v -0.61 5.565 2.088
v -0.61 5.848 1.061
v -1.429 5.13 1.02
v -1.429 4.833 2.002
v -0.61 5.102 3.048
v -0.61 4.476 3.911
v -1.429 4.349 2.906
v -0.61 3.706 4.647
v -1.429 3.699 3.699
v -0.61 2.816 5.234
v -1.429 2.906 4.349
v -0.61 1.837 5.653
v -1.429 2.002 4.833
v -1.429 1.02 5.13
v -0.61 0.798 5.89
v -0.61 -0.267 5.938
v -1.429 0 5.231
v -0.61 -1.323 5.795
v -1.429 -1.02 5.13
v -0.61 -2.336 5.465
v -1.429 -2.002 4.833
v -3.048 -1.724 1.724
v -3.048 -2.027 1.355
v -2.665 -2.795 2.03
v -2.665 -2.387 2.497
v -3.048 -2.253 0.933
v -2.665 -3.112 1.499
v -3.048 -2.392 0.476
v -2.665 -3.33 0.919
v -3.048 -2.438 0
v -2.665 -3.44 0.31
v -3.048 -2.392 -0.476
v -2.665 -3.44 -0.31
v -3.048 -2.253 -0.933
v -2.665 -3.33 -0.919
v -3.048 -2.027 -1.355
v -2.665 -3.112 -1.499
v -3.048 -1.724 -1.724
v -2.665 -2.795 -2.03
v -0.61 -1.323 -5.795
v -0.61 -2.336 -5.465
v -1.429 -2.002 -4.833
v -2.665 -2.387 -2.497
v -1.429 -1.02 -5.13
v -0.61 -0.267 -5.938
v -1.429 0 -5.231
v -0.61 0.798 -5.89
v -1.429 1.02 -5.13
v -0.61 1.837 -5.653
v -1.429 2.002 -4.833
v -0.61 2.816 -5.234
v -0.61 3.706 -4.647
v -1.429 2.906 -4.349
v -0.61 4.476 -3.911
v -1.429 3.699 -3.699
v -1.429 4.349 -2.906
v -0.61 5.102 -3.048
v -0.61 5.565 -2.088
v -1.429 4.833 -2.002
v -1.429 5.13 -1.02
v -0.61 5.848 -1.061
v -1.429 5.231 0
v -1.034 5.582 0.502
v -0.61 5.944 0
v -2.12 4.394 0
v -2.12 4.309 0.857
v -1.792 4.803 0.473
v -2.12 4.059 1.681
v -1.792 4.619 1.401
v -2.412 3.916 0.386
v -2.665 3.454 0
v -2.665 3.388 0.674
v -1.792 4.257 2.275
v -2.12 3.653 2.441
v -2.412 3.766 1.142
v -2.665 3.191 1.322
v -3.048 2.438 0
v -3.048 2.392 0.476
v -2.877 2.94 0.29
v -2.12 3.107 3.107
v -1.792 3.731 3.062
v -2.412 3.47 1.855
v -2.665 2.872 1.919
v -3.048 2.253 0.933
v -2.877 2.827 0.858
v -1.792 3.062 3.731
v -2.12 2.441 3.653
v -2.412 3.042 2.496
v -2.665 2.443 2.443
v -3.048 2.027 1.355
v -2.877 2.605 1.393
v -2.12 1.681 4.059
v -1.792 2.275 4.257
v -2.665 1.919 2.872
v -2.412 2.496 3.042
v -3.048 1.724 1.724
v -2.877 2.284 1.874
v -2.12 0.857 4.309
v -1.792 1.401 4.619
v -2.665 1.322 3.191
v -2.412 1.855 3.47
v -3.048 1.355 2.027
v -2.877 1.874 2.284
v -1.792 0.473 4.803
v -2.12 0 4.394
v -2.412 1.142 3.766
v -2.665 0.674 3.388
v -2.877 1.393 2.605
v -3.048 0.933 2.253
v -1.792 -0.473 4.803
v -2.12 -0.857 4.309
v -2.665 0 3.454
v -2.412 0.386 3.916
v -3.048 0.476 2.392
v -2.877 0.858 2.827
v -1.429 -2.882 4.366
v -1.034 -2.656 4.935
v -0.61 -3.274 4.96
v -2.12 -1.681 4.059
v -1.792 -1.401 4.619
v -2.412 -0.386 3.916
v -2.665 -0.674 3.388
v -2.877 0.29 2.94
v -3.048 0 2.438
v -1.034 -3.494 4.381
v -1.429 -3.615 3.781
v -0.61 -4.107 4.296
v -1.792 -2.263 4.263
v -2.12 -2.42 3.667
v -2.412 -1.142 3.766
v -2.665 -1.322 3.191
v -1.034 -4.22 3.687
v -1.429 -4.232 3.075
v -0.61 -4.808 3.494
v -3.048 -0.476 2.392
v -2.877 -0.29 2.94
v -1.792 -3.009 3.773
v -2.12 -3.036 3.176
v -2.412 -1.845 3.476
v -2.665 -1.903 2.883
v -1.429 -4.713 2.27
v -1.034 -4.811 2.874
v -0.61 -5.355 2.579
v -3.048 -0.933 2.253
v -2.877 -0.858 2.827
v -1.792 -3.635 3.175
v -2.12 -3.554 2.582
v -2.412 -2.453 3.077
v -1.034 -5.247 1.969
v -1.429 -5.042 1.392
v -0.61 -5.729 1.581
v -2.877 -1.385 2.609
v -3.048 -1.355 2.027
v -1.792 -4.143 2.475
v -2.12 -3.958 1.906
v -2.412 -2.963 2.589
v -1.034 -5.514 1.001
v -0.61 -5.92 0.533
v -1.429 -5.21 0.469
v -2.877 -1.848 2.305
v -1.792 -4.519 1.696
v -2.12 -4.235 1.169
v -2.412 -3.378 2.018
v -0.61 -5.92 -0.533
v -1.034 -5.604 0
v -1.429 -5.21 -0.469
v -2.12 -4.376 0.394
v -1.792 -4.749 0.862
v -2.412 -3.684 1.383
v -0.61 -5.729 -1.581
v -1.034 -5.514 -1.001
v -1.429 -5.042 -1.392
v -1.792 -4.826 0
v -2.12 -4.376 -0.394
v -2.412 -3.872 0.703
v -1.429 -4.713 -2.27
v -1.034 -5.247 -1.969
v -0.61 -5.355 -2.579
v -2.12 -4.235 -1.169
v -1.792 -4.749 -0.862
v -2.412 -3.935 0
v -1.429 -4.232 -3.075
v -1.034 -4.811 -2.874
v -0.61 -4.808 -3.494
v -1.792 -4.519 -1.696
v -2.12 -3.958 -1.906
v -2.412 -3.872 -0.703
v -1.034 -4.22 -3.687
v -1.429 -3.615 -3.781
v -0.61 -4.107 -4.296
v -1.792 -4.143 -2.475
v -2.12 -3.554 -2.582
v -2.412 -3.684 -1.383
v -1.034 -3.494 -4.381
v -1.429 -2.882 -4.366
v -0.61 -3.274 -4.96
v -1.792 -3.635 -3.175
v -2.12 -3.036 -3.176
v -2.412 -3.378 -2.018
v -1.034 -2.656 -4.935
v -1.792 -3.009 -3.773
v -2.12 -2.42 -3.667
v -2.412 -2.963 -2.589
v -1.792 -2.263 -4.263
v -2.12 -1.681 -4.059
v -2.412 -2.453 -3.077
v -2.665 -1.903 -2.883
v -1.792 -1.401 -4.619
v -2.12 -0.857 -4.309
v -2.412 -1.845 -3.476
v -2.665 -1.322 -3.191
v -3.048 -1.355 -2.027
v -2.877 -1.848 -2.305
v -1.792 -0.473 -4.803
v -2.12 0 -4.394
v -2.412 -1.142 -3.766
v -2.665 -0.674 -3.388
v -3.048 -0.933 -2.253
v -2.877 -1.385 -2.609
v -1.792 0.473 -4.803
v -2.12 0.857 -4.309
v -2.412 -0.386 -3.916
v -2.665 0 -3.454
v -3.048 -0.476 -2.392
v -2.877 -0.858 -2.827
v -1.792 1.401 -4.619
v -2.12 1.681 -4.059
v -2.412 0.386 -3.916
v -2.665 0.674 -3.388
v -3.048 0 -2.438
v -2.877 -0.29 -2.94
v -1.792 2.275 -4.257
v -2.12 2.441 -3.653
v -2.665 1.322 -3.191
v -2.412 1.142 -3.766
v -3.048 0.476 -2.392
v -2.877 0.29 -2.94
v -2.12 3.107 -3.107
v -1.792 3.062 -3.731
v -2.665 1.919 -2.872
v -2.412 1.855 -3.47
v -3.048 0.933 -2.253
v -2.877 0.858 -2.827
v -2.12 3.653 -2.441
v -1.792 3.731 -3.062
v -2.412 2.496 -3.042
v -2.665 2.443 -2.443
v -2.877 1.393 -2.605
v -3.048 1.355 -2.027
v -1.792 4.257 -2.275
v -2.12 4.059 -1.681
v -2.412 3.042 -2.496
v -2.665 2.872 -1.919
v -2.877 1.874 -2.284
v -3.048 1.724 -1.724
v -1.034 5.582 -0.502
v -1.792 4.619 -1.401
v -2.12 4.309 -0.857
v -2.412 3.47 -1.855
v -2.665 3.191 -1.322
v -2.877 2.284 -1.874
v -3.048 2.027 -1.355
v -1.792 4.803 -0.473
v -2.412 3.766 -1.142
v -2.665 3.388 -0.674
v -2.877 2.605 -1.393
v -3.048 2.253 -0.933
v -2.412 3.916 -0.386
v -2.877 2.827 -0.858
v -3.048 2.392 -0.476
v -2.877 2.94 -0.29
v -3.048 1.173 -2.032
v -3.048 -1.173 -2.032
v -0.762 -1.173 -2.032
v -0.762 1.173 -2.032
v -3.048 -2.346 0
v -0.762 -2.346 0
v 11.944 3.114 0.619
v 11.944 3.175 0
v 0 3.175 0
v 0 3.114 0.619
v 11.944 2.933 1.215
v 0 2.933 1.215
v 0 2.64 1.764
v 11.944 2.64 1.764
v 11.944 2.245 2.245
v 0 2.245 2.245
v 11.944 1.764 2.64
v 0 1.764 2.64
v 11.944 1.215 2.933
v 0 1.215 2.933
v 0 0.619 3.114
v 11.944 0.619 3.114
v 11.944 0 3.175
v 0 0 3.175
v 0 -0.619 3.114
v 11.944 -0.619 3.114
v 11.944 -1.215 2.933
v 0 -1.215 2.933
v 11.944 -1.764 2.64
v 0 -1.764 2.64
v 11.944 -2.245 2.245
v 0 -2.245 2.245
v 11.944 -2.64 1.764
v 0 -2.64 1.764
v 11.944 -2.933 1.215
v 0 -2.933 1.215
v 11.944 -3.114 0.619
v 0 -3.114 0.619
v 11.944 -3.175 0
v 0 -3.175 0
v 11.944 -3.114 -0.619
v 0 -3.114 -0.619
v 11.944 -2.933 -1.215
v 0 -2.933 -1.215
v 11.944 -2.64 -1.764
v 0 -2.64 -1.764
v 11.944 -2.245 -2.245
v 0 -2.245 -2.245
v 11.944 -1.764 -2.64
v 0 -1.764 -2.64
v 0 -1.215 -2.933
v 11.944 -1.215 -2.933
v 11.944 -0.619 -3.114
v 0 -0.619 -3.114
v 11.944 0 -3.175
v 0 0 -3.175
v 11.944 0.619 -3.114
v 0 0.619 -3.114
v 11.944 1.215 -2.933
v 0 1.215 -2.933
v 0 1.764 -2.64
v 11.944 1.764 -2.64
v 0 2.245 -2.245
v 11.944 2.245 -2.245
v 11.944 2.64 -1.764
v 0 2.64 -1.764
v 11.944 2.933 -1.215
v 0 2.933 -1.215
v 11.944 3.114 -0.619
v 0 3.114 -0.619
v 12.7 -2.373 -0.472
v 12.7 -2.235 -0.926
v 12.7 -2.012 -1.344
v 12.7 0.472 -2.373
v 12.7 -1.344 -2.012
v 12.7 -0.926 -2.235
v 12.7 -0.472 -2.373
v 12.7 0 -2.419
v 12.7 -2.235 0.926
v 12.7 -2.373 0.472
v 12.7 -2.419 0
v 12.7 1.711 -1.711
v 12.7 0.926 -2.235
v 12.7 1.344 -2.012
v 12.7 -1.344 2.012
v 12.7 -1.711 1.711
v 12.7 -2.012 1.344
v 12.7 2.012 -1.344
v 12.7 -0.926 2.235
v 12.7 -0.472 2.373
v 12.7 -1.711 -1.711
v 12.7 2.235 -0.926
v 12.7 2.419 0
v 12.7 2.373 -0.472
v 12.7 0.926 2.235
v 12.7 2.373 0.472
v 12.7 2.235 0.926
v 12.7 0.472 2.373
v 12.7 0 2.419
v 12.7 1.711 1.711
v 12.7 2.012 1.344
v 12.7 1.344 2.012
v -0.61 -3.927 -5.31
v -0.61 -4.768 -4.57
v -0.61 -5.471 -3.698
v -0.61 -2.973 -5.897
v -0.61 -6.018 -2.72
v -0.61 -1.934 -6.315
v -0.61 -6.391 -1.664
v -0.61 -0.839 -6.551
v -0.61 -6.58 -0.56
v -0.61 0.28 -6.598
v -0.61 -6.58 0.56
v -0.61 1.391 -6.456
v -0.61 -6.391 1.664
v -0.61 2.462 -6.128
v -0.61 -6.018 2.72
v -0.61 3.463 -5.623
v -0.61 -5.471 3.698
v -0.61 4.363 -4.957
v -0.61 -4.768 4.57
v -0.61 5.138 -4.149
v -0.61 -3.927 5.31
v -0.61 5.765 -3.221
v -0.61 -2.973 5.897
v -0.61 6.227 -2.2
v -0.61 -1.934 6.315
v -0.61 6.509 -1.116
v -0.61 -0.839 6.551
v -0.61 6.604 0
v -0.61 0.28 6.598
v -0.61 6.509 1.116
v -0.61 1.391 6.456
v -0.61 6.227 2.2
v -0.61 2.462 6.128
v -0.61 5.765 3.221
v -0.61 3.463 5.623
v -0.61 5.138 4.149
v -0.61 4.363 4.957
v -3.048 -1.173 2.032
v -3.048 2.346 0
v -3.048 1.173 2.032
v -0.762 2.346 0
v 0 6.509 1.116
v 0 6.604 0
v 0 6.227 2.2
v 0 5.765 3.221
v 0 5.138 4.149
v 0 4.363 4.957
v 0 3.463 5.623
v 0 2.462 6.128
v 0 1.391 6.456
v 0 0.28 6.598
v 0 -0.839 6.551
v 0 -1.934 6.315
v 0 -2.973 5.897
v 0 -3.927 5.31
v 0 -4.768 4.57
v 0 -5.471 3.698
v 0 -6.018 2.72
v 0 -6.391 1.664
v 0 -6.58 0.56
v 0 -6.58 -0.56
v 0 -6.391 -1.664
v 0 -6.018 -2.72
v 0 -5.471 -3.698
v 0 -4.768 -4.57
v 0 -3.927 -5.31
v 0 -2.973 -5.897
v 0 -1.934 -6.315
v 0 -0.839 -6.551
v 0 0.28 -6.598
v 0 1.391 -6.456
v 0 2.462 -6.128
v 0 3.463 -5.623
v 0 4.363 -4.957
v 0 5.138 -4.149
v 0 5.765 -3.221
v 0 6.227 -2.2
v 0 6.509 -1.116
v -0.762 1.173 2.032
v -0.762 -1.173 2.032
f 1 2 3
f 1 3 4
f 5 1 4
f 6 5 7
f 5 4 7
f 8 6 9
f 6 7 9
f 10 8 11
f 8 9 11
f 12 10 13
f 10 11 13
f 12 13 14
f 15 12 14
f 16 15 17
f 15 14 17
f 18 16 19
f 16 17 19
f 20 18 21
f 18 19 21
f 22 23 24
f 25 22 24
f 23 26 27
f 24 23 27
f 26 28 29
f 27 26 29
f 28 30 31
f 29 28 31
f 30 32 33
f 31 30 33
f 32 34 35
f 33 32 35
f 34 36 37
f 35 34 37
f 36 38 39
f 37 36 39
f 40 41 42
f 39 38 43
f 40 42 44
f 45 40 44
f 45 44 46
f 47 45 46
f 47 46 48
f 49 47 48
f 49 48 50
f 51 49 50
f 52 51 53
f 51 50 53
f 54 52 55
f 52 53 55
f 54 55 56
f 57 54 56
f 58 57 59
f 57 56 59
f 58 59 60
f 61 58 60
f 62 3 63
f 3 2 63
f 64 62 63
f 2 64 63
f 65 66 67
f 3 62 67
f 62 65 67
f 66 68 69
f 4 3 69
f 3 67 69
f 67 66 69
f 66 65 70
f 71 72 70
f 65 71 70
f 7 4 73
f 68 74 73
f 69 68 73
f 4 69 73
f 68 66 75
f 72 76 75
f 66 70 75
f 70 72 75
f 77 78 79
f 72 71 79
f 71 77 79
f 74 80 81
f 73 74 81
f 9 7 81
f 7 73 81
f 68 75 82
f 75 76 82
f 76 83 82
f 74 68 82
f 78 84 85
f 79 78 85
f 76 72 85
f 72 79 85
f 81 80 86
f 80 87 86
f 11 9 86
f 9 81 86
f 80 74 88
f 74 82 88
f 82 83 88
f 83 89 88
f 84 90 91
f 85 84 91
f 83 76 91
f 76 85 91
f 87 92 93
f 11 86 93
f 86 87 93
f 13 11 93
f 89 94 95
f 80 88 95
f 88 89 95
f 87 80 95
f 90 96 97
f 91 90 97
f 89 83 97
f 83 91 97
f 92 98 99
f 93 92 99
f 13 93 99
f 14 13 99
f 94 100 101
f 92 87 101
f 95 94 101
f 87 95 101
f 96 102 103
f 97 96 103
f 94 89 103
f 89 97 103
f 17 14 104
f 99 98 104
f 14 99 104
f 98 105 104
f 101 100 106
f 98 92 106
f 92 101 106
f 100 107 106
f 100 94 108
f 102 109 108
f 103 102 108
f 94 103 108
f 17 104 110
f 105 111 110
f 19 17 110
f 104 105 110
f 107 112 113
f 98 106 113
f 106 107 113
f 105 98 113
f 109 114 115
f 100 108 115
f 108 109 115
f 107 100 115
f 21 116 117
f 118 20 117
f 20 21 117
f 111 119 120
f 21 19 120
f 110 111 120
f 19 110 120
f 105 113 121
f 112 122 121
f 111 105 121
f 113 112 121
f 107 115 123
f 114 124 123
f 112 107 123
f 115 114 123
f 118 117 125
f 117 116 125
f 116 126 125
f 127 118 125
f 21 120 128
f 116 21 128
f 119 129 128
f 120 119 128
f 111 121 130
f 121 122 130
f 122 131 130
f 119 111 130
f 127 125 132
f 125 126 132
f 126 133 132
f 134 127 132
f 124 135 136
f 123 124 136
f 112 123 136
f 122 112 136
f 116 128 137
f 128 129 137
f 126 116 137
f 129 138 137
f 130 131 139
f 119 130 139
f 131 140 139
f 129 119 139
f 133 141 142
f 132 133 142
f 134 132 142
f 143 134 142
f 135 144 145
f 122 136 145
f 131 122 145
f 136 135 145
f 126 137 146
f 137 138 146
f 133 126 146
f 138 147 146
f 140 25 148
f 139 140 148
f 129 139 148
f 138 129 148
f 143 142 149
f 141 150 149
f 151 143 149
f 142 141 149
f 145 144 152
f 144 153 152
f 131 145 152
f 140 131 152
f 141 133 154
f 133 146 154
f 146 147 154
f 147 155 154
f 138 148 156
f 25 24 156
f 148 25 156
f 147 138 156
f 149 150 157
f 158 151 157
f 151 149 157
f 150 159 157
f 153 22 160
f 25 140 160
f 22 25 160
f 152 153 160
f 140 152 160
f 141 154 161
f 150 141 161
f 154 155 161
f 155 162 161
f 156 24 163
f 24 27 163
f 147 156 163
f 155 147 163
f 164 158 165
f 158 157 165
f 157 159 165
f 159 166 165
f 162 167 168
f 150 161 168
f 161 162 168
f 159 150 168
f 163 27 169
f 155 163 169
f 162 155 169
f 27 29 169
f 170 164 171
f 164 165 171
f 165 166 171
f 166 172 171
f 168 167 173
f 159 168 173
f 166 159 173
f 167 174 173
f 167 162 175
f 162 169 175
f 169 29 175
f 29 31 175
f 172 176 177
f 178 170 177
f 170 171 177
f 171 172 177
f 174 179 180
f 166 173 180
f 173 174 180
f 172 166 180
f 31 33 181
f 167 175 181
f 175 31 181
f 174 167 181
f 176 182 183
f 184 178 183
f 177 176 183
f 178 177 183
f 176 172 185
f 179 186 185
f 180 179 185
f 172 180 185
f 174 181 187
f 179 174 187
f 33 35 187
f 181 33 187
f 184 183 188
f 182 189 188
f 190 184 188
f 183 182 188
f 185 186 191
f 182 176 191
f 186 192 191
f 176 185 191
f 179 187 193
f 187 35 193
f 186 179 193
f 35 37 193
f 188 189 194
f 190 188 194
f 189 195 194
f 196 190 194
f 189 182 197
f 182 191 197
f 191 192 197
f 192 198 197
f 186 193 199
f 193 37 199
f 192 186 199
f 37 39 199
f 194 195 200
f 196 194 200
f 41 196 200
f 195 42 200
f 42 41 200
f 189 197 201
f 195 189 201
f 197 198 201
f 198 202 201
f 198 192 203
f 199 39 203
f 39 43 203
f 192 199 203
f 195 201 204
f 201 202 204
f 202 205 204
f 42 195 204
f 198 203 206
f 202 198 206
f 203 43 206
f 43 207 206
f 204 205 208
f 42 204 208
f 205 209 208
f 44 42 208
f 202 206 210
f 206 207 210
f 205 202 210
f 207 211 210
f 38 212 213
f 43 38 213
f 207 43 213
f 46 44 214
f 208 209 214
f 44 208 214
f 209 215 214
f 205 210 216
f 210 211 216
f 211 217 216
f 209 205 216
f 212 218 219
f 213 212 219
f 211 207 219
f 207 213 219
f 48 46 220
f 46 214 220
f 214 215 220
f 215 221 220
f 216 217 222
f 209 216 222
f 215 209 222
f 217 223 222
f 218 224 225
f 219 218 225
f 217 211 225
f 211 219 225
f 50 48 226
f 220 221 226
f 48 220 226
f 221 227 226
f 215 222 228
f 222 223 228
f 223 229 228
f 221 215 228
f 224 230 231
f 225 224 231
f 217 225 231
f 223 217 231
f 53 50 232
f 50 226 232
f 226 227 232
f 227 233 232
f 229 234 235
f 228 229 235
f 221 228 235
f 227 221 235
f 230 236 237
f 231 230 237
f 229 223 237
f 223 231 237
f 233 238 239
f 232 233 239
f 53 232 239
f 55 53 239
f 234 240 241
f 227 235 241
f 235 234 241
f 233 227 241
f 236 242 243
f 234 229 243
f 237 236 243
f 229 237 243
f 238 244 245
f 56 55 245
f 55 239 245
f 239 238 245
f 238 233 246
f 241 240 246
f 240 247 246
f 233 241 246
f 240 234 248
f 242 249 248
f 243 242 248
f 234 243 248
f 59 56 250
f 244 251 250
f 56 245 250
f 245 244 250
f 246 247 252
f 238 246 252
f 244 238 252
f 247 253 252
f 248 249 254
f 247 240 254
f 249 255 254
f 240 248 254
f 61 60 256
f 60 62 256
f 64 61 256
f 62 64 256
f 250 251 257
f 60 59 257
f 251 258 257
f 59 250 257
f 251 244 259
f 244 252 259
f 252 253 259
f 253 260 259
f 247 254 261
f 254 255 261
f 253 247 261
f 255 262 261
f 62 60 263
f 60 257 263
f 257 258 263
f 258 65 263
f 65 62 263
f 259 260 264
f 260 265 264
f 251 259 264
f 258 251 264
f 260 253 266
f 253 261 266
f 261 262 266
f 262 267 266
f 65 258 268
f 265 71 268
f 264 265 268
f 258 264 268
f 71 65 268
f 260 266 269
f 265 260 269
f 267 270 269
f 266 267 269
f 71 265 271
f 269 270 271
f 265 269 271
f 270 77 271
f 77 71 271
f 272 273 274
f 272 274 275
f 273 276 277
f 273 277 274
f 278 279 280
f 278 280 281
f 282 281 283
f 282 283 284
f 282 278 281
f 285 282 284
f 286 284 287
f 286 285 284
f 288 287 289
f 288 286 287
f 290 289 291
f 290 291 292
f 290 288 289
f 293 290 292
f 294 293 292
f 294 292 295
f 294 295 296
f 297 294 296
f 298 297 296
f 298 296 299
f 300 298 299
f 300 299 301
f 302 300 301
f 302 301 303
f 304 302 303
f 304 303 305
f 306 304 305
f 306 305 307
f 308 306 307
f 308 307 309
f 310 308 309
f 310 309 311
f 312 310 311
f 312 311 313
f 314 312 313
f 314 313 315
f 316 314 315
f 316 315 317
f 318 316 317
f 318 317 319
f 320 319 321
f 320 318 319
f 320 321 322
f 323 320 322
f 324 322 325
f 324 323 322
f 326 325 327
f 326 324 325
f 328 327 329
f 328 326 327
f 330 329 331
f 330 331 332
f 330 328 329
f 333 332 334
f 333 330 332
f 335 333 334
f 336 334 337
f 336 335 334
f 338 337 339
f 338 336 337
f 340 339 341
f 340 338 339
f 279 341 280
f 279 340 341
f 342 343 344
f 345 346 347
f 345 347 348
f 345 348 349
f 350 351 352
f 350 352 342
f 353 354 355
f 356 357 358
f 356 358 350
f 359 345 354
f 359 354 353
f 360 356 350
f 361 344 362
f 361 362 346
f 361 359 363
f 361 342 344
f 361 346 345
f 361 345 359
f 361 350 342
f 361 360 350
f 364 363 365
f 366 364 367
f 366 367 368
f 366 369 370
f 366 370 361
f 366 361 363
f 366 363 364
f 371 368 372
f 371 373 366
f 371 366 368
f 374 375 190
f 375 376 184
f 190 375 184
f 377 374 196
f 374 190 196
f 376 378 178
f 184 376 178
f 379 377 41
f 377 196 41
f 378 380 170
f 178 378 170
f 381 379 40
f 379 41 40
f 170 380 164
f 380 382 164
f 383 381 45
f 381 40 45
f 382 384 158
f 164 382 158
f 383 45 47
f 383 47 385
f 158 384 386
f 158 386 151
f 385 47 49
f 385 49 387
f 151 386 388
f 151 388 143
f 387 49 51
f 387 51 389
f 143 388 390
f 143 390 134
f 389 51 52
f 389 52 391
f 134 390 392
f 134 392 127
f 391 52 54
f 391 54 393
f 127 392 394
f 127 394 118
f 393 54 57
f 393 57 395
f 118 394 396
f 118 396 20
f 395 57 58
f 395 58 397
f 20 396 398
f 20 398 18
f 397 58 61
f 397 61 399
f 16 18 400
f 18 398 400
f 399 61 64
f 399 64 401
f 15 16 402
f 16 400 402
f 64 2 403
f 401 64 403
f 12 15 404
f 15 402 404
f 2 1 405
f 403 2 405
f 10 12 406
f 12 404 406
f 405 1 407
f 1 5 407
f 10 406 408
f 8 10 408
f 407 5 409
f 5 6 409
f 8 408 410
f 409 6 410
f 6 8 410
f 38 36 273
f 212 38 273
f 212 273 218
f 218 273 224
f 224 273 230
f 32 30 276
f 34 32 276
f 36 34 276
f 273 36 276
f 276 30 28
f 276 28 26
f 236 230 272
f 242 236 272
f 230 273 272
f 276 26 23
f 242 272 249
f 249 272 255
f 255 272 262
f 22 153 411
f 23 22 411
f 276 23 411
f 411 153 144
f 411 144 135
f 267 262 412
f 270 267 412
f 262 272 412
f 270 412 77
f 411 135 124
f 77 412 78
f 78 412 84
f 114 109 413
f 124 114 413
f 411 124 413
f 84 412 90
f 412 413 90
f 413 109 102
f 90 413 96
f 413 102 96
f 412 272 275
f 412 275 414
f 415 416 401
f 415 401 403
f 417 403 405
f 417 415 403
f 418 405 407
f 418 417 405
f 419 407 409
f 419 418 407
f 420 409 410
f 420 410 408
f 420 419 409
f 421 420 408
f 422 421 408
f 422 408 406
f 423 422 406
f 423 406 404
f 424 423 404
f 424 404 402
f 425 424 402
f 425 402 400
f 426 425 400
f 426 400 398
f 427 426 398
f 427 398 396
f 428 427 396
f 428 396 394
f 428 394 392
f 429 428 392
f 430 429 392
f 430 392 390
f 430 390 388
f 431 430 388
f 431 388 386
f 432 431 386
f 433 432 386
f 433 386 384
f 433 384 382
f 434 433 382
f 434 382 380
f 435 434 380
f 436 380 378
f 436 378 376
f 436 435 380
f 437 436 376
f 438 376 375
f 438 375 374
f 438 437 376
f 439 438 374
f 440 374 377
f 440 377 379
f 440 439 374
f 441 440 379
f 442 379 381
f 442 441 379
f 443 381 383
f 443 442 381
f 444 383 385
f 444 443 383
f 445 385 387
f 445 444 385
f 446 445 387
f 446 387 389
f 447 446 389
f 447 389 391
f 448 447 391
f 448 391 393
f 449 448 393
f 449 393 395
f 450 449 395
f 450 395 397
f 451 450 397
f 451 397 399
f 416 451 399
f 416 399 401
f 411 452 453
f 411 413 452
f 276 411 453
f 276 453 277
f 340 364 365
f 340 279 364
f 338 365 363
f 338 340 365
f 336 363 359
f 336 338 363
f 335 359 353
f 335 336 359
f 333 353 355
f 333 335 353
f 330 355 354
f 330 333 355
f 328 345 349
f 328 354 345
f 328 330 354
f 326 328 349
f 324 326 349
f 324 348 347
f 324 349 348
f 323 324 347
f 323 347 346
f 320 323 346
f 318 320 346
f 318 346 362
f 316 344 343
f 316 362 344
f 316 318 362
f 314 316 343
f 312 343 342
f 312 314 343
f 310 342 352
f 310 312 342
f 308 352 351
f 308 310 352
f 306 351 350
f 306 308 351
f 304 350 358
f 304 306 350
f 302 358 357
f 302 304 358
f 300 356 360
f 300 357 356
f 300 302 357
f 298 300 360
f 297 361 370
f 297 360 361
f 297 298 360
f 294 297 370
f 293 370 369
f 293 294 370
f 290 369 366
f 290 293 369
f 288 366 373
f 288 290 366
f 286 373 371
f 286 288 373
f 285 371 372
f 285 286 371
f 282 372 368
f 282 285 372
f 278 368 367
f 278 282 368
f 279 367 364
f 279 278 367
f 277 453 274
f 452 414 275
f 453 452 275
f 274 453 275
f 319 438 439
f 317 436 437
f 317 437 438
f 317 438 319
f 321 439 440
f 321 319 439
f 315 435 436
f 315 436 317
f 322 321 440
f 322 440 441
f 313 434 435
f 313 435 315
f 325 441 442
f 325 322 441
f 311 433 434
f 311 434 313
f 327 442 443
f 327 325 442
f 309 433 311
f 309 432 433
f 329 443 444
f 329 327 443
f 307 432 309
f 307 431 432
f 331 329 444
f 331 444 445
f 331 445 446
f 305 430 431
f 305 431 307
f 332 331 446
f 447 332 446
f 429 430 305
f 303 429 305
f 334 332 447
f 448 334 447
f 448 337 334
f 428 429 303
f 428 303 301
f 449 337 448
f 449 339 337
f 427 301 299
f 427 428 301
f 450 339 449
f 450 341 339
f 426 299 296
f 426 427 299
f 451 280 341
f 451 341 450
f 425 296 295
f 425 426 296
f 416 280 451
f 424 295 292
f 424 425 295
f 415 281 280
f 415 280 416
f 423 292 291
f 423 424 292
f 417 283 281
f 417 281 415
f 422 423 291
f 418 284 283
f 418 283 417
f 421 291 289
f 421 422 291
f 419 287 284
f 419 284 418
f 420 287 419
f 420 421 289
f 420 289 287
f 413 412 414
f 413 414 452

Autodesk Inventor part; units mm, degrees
sketch "Sketch_1" plane through (0, 0, 0) normal (0, 0, 1) x (1, 0, 0)
  line L0 (12.7, 0) -> (-3.048, 0)
  line L1 (-3.048, 0) -> (-3.048, 2.4384)
  arc A0 (-0.6096, 5.9436) -> (-3.048, 2.4384) centre (3.3013, 0.6222) ccw
  line L2 (-0.6096, 5.9436) -> (-0.6096, 6.604)
  line L3 (-0.6096, 6.604) -> (0, 6.604)
  line L4 (0, 6.604) -> (0, 3.175)
  line L5 (0, 3.175) -> (11.9444, 3.175)
  line L6 (11.9444, 3.175) -> (12.7, 2.4194)
  line L7 (12.7, 2.4194) -> (12.7, 0)
  line L8 (12.7, 0) -> (-3.048, 0)
revolve "Revolution1" add sketch "Sketch_1" angle 360 about axis through (12.7, 0, 0) along (1, 0, 0)
thread "Thread1" size "1/4-20 UNC" class "2A" standard "ANSI Unified Screw Threads" length 10.6355
sketch "Sketch_2" plane through (-3.048, 0, 0) normal (1, 0, 0) x (0, 0, -1)
  line L0 (-2.032, -1.1732) -> (0, -2.3464)
  line L1 (0, -2.3464) -> (2.032, -1.1732)
  line L2 (2.032, -1.1732) -> (2.032, 1.1732)
  line L3 (2.032, 1.1732) -> (0, 2.3464)
  line L4 (0, 2.3464) -> (-2.032, 1.1732)
  line L5 (-2.032, 1.1732) -> (-2.032, -1.1732)
extrude "Extrusion1" cut sketch "Sketch_2" along normal blind 2.286
ref_plane "screw_XY" through (0, 0, 0) normal (1, 0, 0) x (0, 0, -1)
ref_plane "screw_YZ" through (0, 0, 0) normal (0, 0, -1) x (0, 1, 0)
ref_plane "screw_ZX" through (0, 0, 0) normal (0, 1, 0) x (1, 0, 0)
ref_plane "to_nut_XY" through (12.7, 0, 0) normal (1, 0, 0) x (0, 0, -1)
ref_plane "to_nut_YZ" through (12.7, 0, 0) normal (0, 0, -1) x (0, 1, 0)
ref_plane "to_nut_ZX" through (12.7, 0, 0) normal (0, 1, 0) x (1, 0, 0)
properties part number "3342"
